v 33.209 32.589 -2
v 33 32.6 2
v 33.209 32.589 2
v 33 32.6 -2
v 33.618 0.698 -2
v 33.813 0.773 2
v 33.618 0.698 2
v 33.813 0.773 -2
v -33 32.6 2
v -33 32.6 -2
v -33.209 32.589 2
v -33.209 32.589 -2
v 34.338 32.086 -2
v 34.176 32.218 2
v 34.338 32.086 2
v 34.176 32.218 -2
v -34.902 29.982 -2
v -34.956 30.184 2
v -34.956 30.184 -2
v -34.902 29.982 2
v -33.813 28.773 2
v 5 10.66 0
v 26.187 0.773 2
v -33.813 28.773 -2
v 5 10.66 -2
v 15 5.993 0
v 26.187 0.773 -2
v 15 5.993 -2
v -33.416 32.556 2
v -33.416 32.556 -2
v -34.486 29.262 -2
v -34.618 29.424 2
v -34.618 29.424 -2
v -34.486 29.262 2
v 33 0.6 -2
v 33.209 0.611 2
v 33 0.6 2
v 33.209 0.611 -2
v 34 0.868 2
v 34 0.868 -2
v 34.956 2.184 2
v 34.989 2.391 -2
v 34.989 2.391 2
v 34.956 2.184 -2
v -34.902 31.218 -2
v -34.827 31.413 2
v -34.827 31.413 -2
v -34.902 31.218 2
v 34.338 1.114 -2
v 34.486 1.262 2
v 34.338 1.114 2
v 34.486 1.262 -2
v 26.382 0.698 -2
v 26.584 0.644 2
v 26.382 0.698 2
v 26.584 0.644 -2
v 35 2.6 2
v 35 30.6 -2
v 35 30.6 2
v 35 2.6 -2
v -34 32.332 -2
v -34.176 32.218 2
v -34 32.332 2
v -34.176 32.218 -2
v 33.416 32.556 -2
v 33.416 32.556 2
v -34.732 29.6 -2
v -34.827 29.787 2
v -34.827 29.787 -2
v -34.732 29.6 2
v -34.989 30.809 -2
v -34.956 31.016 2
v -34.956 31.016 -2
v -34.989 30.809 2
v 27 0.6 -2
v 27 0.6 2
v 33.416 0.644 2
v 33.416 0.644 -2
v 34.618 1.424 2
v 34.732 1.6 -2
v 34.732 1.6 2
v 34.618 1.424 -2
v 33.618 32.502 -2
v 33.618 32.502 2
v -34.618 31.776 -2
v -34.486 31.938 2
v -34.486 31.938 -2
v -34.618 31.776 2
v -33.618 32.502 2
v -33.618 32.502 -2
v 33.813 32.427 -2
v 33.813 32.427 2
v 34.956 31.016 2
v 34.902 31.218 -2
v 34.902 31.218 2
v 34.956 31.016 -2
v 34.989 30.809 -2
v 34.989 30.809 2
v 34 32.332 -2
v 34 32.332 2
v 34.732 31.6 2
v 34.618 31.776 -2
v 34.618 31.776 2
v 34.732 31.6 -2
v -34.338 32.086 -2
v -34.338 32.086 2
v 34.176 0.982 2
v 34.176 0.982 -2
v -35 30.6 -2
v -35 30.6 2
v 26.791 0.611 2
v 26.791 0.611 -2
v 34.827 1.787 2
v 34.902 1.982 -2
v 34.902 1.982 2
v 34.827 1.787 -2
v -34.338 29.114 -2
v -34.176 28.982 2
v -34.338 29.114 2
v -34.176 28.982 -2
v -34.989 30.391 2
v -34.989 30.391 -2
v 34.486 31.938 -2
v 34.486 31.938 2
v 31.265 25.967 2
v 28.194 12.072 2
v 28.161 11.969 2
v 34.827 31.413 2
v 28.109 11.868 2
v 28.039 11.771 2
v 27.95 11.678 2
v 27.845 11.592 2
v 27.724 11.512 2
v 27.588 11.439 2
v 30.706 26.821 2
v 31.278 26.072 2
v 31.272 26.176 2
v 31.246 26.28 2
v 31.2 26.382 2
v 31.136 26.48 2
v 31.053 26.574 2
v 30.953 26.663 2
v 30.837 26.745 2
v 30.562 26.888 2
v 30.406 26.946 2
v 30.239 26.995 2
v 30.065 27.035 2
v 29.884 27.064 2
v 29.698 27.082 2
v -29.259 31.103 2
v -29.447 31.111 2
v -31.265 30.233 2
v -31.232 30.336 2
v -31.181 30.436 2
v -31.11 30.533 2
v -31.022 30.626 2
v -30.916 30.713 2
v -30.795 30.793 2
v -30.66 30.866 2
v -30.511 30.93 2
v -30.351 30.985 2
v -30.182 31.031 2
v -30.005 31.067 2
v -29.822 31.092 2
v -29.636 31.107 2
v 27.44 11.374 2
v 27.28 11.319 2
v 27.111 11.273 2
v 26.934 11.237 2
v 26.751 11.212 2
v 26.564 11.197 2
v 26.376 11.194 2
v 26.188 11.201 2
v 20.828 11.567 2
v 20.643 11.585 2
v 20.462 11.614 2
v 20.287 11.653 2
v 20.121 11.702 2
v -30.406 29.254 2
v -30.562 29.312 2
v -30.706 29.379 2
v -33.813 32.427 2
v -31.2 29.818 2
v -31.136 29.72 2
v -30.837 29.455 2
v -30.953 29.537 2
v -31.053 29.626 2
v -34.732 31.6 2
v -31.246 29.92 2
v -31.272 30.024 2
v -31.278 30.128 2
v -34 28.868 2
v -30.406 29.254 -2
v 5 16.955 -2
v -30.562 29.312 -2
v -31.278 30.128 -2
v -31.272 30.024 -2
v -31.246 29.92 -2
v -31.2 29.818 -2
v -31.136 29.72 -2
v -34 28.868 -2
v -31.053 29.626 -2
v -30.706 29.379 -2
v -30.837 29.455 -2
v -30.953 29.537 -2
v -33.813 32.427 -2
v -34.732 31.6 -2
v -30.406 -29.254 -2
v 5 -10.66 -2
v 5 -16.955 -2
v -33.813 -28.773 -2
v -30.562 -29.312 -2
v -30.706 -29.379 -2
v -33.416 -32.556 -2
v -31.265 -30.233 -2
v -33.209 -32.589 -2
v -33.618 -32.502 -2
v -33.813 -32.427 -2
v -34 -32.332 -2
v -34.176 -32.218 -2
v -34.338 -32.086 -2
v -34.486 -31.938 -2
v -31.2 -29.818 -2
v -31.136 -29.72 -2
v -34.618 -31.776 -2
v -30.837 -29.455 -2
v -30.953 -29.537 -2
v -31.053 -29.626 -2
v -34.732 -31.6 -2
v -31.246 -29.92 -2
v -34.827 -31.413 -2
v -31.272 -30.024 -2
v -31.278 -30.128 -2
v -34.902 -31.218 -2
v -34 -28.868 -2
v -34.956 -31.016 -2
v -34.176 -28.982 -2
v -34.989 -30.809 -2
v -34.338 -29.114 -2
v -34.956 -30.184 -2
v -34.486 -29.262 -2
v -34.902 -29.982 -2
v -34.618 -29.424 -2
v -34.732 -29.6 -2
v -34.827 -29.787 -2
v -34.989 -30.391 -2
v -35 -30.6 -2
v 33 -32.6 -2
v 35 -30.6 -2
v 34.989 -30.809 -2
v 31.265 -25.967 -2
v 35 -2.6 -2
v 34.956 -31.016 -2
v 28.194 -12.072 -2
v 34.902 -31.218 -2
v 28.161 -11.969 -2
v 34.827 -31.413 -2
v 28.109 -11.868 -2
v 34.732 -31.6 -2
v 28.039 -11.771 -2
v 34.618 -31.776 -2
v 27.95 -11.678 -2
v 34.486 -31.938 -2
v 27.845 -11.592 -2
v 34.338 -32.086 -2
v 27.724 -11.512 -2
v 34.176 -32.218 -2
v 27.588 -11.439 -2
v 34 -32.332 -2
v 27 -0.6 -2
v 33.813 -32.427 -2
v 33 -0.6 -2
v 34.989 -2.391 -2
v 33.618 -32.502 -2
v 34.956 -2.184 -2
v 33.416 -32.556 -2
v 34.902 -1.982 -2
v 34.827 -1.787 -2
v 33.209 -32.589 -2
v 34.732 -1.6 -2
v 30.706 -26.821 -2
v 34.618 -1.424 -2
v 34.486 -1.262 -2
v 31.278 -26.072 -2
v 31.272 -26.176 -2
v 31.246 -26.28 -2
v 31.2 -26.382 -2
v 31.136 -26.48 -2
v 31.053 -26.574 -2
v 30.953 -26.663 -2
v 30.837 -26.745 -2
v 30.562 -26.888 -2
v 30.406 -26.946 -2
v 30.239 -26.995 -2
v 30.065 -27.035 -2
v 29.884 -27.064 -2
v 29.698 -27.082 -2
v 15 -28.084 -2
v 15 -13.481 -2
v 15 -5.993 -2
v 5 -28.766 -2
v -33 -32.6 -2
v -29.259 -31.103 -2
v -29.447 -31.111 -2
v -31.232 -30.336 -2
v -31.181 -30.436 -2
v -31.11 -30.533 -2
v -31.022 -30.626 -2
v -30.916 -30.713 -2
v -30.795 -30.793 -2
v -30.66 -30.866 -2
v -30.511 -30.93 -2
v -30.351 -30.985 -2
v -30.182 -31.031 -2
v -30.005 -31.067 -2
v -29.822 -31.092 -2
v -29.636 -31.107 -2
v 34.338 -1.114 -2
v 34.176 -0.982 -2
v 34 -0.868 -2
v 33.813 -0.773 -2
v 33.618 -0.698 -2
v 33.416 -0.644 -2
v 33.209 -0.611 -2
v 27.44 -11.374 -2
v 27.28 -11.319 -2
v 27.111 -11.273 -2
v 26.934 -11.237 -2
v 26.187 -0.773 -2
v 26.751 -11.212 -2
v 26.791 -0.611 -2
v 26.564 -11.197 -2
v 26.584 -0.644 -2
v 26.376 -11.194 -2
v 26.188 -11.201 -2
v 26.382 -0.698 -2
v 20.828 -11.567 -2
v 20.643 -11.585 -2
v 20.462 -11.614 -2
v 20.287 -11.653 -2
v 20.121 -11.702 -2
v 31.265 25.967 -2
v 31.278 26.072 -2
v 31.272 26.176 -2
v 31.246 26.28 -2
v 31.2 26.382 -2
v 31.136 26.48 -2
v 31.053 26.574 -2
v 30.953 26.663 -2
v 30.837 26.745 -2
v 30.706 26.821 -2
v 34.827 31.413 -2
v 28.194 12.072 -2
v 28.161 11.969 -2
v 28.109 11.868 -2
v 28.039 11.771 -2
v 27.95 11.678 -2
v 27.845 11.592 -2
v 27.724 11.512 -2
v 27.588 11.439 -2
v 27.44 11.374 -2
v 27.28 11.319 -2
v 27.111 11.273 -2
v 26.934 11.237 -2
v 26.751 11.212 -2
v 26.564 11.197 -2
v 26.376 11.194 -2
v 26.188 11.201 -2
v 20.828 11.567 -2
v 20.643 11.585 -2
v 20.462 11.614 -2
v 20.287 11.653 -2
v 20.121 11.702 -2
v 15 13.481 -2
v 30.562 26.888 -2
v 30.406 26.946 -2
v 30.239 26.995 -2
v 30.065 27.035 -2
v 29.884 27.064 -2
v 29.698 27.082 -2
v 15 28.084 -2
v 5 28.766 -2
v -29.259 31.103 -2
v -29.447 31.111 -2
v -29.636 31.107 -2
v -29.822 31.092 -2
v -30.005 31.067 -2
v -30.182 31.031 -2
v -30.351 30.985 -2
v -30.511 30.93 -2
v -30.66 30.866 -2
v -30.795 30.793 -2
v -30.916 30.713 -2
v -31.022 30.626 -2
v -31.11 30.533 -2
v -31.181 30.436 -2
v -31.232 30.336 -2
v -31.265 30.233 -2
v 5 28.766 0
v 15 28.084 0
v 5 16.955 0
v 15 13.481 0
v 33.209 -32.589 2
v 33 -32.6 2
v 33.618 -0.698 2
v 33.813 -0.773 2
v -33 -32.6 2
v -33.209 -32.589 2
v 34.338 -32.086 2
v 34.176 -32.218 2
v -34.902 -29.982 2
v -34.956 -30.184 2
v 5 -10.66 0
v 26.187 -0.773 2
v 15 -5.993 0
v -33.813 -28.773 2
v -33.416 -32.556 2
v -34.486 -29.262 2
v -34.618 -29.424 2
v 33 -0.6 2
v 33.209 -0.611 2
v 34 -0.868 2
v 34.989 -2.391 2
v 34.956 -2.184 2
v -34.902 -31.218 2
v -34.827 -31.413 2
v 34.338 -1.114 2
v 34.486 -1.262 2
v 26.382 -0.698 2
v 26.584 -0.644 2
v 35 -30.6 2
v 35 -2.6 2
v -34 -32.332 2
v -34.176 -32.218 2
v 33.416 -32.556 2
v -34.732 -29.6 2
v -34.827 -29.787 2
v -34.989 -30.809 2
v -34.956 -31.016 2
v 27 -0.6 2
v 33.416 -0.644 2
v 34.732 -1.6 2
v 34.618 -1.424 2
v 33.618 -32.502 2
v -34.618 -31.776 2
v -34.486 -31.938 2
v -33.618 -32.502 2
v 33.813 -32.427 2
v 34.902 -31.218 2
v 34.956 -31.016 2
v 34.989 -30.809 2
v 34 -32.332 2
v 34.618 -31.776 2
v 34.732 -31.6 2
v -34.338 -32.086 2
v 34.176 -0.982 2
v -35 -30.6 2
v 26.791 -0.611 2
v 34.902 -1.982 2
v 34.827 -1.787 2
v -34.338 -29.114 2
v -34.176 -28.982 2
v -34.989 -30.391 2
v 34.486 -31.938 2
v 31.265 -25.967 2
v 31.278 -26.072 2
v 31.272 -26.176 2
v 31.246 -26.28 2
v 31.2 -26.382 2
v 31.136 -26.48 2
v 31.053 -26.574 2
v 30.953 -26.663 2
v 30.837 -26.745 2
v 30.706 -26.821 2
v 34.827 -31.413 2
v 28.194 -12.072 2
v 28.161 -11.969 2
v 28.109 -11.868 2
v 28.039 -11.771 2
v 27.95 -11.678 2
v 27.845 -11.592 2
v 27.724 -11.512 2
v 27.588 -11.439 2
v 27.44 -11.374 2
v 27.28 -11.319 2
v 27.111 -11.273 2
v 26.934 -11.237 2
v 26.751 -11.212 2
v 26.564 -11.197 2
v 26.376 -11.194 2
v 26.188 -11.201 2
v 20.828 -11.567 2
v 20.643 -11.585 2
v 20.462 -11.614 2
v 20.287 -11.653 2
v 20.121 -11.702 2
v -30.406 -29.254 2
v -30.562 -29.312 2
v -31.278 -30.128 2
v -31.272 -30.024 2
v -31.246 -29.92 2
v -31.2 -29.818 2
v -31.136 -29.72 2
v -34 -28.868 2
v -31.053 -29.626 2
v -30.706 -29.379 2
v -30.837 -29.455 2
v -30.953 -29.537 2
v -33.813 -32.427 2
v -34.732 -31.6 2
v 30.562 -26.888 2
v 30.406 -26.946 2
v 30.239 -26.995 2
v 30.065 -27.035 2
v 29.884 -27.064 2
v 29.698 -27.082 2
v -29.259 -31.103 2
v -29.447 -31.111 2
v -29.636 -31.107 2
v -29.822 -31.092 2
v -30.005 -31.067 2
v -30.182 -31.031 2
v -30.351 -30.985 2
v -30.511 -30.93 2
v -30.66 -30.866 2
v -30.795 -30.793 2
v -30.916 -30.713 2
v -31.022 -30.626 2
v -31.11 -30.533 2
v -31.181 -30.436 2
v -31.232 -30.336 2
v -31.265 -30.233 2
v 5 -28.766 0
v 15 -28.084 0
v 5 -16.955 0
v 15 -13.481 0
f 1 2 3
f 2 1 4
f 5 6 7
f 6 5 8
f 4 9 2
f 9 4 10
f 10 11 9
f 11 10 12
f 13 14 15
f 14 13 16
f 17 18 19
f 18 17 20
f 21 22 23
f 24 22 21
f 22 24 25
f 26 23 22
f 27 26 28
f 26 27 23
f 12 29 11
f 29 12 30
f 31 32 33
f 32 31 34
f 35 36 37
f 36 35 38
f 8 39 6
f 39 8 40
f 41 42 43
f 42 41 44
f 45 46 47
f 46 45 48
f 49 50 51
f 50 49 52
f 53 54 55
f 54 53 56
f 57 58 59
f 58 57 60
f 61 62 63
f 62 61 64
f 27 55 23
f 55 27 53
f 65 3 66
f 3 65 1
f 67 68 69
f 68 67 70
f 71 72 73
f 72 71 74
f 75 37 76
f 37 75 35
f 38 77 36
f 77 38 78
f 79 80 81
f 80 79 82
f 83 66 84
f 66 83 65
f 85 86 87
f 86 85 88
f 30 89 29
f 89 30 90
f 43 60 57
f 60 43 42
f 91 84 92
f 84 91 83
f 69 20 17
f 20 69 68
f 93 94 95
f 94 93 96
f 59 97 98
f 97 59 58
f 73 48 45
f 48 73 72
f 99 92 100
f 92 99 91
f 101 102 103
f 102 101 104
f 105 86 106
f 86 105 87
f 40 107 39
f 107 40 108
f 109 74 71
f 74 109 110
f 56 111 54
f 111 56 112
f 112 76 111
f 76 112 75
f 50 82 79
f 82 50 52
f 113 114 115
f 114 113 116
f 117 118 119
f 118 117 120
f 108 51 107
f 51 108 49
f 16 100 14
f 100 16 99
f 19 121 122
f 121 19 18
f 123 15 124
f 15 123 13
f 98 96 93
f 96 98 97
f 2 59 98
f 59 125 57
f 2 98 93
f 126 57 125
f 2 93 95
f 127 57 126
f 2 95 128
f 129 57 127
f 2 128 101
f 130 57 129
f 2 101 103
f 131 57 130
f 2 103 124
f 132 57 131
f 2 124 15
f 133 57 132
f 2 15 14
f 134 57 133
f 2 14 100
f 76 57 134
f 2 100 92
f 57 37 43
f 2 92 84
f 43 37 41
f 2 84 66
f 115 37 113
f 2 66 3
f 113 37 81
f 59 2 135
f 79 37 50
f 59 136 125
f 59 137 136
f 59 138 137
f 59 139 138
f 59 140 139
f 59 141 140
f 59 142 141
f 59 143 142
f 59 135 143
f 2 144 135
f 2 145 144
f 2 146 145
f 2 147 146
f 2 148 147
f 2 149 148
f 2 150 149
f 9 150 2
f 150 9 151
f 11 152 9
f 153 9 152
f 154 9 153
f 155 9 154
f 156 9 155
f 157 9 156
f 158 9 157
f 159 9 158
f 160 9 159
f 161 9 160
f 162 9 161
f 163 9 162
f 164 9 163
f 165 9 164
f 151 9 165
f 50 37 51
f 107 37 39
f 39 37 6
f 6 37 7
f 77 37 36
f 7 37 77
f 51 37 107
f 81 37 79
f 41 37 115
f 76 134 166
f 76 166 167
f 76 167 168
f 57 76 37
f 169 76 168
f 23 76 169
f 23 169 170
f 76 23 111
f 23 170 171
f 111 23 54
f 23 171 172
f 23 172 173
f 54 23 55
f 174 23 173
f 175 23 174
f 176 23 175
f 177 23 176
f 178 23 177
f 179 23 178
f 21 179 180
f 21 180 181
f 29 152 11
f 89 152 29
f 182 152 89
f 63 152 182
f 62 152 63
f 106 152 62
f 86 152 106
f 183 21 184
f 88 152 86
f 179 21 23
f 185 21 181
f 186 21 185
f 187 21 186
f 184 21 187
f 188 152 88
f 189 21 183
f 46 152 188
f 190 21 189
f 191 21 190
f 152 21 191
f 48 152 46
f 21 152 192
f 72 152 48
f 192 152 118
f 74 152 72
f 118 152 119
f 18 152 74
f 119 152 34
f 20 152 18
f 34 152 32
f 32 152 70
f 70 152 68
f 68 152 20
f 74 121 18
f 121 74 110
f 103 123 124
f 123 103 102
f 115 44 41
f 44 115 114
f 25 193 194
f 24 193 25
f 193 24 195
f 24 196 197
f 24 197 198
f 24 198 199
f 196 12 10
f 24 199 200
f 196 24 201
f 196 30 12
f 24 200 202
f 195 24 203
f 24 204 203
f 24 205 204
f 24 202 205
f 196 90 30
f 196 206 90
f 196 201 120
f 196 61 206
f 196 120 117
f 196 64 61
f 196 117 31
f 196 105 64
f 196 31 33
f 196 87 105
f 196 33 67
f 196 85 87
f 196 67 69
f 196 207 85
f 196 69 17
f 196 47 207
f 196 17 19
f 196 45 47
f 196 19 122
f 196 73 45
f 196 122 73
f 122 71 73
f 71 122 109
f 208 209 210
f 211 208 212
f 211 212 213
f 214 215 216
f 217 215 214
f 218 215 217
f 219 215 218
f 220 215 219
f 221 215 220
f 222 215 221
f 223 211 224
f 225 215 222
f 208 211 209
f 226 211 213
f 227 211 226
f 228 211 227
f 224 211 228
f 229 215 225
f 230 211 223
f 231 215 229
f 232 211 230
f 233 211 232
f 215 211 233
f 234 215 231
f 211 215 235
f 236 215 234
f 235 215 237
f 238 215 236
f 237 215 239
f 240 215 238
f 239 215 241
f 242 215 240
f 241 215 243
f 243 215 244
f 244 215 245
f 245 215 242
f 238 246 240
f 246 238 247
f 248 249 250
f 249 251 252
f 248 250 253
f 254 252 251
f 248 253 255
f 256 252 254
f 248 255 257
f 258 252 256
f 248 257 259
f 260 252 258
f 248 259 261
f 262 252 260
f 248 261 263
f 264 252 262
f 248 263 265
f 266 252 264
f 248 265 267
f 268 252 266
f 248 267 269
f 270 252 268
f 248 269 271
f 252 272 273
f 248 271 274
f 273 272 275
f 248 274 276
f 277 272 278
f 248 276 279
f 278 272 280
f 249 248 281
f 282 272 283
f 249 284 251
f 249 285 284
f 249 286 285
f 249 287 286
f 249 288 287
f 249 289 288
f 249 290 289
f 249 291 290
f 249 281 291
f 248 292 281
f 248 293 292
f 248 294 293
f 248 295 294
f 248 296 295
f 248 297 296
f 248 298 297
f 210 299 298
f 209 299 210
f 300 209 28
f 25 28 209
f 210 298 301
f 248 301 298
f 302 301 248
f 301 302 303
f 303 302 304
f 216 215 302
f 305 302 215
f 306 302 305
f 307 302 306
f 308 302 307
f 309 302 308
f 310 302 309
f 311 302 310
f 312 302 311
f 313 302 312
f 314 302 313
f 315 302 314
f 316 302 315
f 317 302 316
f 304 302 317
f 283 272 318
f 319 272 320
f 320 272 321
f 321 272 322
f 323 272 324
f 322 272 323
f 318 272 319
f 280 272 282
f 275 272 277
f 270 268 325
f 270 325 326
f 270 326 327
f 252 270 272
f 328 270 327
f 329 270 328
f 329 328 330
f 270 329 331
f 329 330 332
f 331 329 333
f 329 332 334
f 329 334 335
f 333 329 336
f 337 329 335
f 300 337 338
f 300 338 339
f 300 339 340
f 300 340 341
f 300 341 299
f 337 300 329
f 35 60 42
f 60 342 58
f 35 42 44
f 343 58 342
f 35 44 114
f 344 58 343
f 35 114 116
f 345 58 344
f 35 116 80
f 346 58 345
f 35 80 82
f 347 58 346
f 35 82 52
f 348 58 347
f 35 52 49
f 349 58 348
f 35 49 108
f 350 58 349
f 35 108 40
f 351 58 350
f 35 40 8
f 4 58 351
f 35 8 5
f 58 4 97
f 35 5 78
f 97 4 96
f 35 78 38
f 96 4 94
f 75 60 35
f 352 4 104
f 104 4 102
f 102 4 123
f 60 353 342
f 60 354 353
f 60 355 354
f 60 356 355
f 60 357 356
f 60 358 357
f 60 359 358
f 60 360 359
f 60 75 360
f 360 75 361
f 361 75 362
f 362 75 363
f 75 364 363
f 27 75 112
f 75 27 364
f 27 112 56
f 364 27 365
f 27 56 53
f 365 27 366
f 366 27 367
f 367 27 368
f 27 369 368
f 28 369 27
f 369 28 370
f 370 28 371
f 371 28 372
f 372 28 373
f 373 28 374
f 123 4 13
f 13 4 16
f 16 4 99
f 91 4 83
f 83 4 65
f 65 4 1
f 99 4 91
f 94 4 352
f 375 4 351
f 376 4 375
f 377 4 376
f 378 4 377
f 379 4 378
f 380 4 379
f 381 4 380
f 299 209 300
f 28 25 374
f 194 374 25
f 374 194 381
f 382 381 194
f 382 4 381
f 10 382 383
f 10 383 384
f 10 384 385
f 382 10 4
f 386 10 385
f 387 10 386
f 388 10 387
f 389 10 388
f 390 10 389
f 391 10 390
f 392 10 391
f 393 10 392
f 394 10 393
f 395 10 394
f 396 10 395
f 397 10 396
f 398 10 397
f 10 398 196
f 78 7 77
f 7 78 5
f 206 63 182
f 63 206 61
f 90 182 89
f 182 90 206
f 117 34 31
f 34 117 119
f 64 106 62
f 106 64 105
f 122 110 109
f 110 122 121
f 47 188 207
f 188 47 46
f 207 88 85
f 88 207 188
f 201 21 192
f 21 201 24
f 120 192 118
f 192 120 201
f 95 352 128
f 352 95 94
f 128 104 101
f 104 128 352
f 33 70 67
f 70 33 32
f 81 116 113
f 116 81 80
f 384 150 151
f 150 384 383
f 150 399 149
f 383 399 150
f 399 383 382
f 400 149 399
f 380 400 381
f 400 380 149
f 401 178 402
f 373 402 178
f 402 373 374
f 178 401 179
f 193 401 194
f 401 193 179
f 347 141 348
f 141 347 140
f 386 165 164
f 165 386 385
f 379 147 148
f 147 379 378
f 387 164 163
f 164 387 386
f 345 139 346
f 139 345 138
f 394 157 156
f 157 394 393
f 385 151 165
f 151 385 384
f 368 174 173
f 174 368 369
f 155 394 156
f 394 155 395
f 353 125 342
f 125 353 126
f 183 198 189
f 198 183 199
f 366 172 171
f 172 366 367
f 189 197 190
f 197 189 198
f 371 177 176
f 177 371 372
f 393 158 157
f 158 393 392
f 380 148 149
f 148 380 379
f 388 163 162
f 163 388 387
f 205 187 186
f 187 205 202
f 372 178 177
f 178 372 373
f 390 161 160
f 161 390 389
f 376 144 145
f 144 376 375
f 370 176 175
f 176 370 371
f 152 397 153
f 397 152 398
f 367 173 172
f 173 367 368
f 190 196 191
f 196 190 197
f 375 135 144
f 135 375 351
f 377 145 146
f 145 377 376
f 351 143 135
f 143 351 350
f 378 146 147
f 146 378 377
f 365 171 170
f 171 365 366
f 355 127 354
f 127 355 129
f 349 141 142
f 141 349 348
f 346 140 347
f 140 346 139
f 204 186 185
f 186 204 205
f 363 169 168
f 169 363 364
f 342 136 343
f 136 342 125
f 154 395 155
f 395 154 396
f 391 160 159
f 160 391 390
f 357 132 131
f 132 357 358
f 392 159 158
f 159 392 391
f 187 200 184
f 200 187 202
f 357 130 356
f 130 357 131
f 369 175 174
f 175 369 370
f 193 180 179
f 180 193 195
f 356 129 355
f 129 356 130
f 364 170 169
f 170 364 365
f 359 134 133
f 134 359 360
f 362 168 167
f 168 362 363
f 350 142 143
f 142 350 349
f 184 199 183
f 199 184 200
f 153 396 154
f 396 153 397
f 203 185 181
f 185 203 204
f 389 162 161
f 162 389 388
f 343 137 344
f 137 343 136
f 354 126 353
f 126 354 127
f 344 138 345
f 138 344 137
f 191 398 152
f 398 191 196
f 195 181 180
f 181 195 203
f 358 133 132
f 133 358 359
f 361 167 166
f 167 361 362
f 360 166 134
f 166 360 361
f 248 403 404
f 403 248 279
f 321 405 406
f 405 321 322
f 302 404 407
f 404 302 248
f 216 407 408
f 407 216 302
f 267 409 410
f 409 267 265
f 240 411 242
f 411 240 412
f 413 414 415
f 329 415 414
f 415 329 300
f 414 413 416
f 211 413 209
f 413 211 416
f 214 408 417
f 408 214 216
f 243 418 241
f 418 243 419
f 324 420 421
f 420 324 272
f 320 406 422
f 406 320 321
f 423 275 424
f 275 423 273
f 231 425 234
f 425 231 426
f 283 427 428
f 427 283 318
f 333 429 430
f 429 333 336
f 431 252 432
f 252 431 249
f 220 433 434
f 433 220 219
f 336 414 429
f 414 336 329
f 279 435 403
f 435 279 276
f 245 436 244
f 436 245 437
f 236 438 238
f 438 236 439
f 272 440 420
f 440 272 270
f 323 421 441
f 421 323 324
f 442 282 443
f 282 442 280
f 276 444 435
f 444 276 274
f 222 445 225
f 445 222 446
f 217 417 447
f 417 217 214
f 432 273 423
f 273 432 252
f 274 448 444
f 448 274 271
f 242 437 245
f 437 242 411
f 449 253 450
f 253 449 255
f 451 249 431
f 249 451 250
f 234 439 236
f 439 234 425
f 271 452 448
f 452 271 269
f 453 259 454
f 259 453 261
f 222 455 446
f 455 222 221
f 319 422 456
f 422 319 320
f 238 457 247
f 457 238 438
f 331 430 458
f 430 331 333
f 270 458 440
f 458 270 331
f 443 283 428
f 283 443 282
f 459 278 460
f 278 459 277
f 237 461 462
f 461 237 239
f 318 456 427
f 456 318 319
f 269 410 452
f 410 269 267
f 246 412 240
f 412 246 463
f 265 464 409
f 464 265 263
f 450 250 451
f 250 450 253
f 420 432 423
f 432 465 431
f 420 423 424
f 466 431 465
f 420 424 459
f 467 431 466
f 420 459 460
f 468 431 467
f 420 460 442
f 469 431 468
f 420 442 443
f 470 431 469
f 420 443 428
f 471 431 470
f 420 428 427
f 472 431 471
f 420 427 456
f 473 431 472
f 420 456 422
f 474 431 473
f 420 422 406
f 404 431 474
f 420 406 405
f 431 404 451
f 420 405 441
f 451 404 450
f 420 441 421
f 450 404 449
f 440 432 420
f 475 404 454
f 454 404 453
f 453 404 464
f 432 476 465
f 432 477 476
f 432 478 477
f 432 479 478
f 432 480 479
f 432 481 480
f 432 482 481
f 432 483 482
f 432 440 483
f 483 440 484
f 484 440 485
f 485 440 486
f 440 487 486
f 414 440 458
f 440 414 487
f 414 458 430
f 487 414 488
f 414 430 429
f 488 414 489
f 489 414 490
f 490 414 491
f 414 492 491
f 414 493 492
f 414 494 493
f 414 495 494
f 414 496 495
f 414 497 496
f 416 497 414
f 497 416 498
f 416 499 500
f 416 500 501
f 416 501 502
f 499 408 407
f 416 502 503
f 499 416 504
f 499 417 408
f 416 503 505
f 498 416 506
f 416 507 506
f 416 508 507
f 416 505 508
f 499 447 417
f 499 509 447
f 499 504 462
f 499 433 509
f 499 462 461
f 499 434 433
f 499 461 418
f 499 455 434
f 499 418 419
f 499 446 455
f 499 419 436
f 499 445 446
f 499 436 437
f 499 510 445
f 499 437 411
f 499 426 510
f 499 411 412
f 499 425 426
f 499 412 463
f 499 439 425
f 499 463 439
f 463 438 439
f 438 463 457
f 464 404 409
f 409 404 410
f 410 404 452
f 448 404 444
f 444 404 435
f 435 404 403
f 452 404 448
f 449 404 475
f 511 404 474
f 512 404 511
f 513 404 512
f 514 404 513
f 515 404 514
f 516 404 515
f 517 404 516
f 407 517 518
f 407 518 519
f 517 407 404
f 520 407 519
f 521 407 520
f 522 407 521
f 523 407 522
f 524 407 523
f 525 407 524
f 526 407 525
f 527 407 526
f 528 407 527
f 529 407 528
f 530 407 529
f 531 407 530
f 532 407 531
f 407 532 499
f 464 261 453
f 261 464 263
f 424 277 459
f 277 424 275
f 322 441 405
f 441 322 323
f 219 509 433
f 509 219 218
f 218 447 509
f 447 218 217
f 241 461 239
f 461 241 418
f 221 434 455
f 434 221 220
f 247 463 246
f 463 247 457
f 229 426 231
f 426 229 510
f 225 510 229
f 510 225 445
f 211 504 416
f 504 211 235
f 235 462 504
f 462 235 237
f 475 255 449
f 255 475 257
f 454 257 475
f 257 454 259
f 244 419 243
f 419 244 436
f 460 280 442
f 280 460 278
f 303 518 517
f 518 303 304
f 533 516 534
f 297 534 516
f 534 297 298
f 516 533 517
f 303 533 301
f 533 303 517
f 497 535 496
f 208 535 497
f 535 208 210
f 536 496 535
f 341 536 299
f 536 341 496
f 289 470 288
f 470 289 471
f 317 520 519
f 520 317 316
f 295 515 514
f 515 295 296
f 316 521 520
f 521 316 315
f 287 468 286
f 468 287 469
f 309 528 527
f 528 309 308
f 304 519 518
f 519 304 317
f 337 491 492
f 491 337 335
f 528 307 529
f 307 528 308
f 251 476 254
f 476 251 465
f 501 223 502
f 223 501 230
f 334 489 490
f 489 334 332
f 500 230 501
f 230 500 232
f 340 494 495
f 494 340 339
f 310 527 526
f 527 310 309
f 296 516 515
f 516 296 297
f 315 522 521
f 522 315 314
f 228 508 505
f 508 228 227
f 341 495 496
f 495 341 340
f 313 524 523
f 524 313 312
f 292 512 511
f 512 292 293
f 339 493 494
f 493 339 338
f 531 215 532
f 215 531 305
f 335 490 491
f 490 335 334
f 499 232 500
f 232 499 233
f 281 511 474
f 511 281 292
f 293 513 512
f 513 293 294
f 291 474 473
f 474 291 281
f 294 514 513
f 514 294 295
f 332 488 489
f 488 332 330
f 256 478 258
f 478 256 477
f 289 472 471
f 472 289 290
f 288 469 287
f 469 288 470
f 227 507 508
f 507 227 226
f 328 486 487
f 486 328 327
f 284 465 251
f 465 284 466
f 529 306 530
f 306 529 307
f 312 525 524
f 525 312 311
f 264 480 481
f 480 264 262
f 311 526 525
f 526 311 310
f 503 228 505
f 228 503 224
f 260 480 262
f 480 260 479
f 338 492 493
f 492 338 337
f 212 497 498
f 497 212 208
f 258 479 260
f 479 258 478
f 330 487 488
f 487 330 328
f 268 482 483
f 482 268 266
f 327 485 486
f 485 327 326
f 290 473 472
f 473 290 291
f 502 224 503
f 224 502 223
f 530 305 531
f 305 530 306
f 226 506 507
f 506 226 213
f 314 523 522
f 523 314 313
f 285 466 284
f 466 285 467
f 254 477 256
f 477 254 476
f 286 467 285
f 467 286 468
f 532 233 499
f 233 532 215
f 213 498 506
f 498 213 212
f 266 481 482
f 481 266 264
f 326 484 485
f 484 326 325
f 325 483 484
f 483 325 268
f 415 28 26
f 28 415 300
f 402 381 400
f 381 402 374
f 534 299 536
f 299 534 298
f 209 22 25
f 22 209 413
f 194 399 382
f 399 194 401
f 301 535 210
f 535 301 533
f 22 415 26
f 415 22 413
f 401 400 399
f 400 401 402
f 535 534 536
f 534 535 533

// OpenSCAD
// file: ../../../scadLib/library.scad
////////////////////////////////////////////////////////////////////////////////////////////////////
module plate4Point(x,y,z,d){
	hull(){
		color("green") translate([(x/2)-(d/2) ,(y/2) -(d/2),0]) cylinder(h=z, d=d, center=true);
		color("blue")  translate([(x/2)-(d/2) ,-(y/2)+(d/2),0]) cylinder(h=z, d=d, center=true);
		color("red")   translate([-(x/2)+(d/2),(y/2) -(d/2),0]) cylinder(h=z, d=d, center=true);
		color("grey")  translate([-(x/2)+(d/2),-(y/2)+(d/2),0]) cylinder(h=z, d=d, center=true);
	}
}
////////////////////////////////////////////////////////////////////////////////////////////////////
module plate2Point(x,z,d){
	hull(){
		color("green") translate([(x/2) -(d/2),0 ,0]) cylinder(h=z, d=d, center=true);
		color("blue")  translate([-(x/2)+(d/2),0 ,0]) cylinder(h=z, d=d, center=true);
	}
}
////////////////////////////////////////////////////////////////////////////////////////////////////
module triagleSphere(iX, iY, iZ, iD){
	
	halfD = iD/2;
	hull(){
		color("red")		translate([-halfD   , (iY/2)-halfD, halfD]) sphere(d=iD);	
		color("grey")		translate([-iX+halfD, (iY/2)-halfD, halfD]) sphere(d=iD);
		color("green")	translate([-halfD   , (iY/2)-halfD, iZ-halfD]) sphere(d=iD);

		color("red")		translate([-halfD   , -(iY/2)+halfD, halfD]) sphere(d=iD);
		color("grey")		translate([-iX+halfD, -(iY/2)+halfD, halfD]) sphere(d=iD);
		color("green")	translate([-halfD   , -(iY/2)+halfD, iZ-halfD]) sphere(d=iD);
	}
}
////////////////////////////////////////////////////////////////////////////////////////////////////
module cubeSphere(iX, iYm, iZ, iD){

	edgeDiamitor = iD;
	
	hull(){
		for(a=[[1,1,1],[-1,1,1],[1,-1,1],[-1,-1,1],[1,1,-1],[-1,1,-1],[1,-1,-1],[-1,-1,-1]]){
			translate([
				a[0]*((iX/2) -(edgeDiamitor/2)), 
				a[1]*((iYm/2)-(edgeDiamitor/2)), 
				a[2]*((iZ/2) -(edgeDiamitor/2))]) sphere(d=edgeDiamitor);
		}
	}
} 
////////////////////////////////////////////////////////////////////////////////////////////////////
module mText(l, letter_size = 10, letter_height = 4) {
// Use linear_extrude() to make the letters 3D objects as they
// are only 2D shapes when only using text()
	font = "Bitstream Vera Sans:style=Bold" ;
	linear_extrude(height = letter_height) {
		text(l, size = letter_size, font = font, halign = "center", valign = "center", $fn = 16);
	}
}
module roundedTrapezoid(x1=1, y1=1,x2=1, y2=1, z1=1, d1=6){
  hull(){
  // top Right
    translate([-x1,y1,0])
      cylinder(h=z1,d=d1,center=true);
  // Top Left
    translate([-x1,-y1,0])
      cylinder(h=z1,d=d1,center=true);
  // Bottom Right
    translate([-x2,y2,0])
      cylinder(h=z1,d=d1,center=true);
  // Bottom Left
    translate([-x2,-y2,0])
      cylinder(h=z1,d=d1,center=true);
  }
}
// main file
 $fn = 60;

use<../../../scadLib/library.scad>;

cabnetWidth = 329.946;
cabnetHeigth = 159.004;
cabnetDepth = 189.992;

cabnetWallthickness = 5.8;
cabnetdrawerSpaceing = 3;

$opening_Depth = 99;
/*

FH = Full Heigth
FW = Full Width 

HH = Half Heigth
HW = Half Width

*/
opening_HW_Width  = 156; // (cabnetWidth/2) -(3*cabnetWallthickness);
opening_HH_Heigth = 72;  //(cabnetHeigth/2)-(3*cabnetWallthickness);

drawer_HW_HW_FrontWidth  = 153; //   = opening_HW_Width  -(1*cabnetdrawerSpaceing);
drawer_HH_HW_FrontHeigth = 69;  //   = opening_HH_Heigth-(1*cabnetdrawerSpaceing);

drawer_FrontThickness = cabnetWallthickness;

magnetDiamiter = 11.2;
magnetthicness = 2.2;

//openingModel(opening_HW_Width, opening_HH_Heigth);


wHeigth = opening_HH_Heigth-drawer_FrontThickness-1;

//translate([
//	0,
//	(-drawer_HH_HW_FrontHeigth/2)+(2*cabnetWallthickness),
//	(drawer_HH_HW_FrontHeigth/2)-1.5
//	])
//	rotate([-90,0,0])
//	drawerModel(drawer_HW_HW_FrontWidth, drawer_HH_HW_FrontHeigth, drawer_FrontThickness);
//+difference(){
//rotate([90,0,90]) translate([-10,-2.5,-(drawer_HW_HW_FrontWidth/2)])

	sideRail(wHeigth, 4);

//translate([-35,0,0])
//  cube([80,100,20],center=true);
  
//translate([0,-20,0])#
//  cube([80,40,20],center=true);
//}
	



//---------------------------------------------------------
module sideRail(iHeigth, iDepth=10){

	wPlateWidth = 10;
	wPlateHeigth = 2;

	translate([10,0,-(iDepth/2)+(wPlateHeigth/2)])
		plate4Point(wPlateWidth, iHeigth, wPlateHeigth, 4);
	
	color("red")
		translate([0,(iHeigth/2)-2,0]) 
		sideRailMount(iHeigth, iDepth);
	color("blue")
		mirror([0,90,0])
		translate([0,(iHeigth/2)-2,0]) 
		sideRailMount(iHeigth, iDepth);
}
//---------------------------------------------------------
module sideRailMount(iHeigth, iDepth, iStep=0){
	
	difference(){
		sideRailMount2(iHeigth, iDepth);
		scale([.9,.5,1.5])
			translate([0,-5,0])
			rotate([0,0,-7])
			sideRailMount2(iHeigth, iDepth);
	}
}
//---------------------------------------------------------
module sideRailMount2(iHeigth, iDepth=10){
	
	wLength     = drawer_HH_HW_FrontHeigth + 5;
	wDiamiter   = 4;
	wFaceHeigth = 28;
	wDepth      = iDepth;
	
	hull(){
		translate([(wLength/2)-(wDiamiter),0,0]) color("red") // TR
			cylinder(d=wDiamiter, h=wDepth,center=true);
		translate([(wLength/2)-(wDiamiter),-wFaceHeigth,0]) color("blue")  // BR
			cylinder(d=wDiamiter, h=wDepth,center=true);
		translate([(-wLength/2)+(wDiamiter),0,0]) color("green") // TL
			cylinder(d=wDiamiter, h=wDepth,center=true);
		translate([(wLength/2)-(wDiamiter)-6,-wFaceHeigth,0]) color("blue")  // BL
			cylinder(d=wDiamiter, h=wDepth,center=true);
	}
}
//---------------------------------------------------------
module magnet(iAjustHeigth=0){
	cylinder(d=magnetDiamiter , h=magnetthicness+iAjustHeigth , center=true);
//    cube([6.2,6.2,1],center=true);
}
//---------------------------------------------------------
module openingModel(iWidth, iHeigth, iDepth=10){
	wWidth  = iWidth  + (2*cabnetWallthickness);
	wHeigth = iHeigth + (2*cabnetWallthickness);
	difference(){
		cube([wWidth, iDepth, wHeigth],center=true);
		cube([iWidth, iDepth+1, iHeigth],center=true);
	}
}
//---------------------------------------------------------
module drawerModel(iWidth, iHeigth, iDepth=10){
	wDiamiter = 50;
	difference(){
		cube([iWidth, iDepth, iHeigth],center=true);
		rotate([90,0,0])
			translate([0,(iHeigth/2),0])
			cylinder(d=wDiamiter, h=iDepth+1, center=true);
	}
}
